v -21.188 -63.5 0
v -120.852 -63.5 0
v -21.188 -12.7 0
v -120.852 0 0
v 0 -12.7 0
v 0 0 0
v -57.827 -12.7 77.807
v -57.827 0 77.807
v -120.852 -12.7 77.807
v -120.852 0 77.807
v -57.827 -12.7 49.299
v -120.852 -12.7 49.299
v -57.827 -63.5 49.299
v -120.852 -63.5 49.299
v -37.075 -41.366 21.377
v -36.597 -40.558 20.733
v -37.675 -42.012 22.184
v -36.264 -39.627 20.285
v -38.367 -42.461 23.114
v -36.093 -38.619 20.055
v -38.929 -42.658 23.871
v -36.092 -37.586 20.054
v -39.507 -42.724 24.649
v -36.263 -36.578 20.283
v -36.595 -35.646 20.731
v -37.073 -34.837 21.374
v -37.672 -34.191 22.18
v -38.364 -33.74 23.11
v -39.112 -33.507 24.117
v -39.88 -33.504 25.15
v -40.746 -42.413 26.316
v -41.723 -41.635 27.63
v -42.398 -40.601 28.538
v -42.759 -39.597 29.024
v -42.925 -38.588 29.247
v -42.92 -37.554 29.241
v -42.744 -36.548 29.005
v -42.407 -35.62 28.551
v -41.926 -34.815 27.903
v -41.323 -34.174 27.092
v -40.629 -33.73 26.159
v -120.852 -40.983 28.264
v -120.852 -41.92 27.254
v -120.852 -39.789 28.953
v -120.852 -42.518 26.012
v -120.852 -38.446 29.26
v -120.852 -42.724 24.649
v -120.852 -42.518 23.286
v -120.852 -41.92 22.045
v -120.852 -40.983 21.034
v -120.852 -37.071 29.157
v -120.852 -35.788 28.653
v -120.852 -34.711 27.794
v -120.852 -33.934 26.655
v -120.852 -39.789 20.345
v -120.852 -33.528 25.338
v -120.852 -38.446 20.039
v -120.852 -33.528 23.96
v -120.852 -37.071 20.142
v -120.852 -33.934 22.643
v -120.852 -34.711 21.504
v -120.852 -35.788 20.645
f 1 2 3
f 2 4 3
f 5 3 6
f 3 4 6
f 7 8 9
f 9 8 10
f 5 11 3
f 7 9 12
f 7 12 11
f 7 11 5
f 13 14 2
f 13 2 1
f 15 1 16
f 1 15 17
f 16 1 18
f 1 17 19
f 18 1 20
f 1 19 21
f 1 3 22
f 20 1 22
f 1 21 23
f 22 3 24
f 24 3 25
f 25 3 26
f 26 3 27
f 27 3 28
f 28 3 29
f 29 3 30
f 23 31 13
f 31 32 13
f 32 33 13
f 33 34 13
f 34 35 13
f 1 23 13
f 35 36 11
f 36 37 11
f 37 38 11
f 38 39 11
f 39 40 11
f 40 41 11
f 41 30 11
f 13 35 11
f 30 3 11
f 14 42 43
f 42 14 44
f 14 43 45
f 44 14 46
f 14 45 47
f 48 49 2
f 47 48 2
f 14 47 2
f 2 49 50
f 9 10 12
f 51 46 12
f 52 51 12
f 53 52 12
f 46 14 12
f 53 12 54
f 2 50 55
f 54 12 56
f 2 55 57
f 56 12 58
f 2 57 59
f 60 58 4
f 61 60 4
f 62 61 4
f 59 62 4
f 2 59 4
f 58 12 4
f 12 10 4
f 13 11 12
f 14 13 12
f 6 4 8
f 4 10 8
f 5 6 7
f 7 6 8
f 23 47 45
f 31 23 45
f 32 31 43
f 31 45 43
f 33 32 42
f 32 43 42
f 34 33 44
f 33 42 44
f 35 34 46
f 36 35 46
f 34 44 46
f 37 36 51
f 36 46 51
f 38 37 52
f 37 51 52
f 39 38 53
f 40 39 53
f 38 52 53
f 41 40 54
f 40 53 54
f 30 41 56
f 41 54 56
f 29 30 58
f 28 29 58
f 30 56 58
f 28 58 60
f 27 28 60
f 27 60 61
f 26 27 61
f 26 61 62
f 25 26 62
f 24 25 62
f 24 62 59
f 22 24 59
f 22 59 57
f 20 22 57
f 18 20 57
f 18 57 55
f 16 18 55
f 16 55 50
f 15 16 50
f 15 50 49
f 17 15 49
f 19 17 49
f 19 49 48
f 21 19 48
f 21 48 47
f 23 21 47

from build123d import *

# Parameters (mm, degrees)
F1_DEPTH = 12.7
F3_DEPTH = 50.8
F4_R     = 4.623587
F5_DEPTH = 120.853254


with BuildPart() as f1:
    # F0 (on Front) → F1 (new body)
    with BuildSketch(Plane.XZ):
        Polygon((-120.852254, 0), (0, 0), (-57.827156, 77.806771), (-120.852254, 77.806771), align=None)
    extrude(amount=F1_DEPTH)

    # F2 (on face) → F3 (join)
    with BuildSketch(Plane.XZ.offset(12.7)):
        Polygon((-57.827156, 49.29851), (-120.852254, 49.29851), (-120.852254, 0), (-21.187766, 0), align=None)
    extrude(amount=F3_DEPTH)

    # F4 (on face) → F5 (cut, through all)
    with BuildSketch(Plane(origin=(-120.852254, 0, 0), x_dir=(0, -1, 0), z_dir=(-1, 0, 0))):
        with Locations((38.1, 24.649255)):
            Circle(F4_R)
    extrude(amount=-F5_DEPTH, mode=Mode.SUBTRACT)


solid = f1.part
